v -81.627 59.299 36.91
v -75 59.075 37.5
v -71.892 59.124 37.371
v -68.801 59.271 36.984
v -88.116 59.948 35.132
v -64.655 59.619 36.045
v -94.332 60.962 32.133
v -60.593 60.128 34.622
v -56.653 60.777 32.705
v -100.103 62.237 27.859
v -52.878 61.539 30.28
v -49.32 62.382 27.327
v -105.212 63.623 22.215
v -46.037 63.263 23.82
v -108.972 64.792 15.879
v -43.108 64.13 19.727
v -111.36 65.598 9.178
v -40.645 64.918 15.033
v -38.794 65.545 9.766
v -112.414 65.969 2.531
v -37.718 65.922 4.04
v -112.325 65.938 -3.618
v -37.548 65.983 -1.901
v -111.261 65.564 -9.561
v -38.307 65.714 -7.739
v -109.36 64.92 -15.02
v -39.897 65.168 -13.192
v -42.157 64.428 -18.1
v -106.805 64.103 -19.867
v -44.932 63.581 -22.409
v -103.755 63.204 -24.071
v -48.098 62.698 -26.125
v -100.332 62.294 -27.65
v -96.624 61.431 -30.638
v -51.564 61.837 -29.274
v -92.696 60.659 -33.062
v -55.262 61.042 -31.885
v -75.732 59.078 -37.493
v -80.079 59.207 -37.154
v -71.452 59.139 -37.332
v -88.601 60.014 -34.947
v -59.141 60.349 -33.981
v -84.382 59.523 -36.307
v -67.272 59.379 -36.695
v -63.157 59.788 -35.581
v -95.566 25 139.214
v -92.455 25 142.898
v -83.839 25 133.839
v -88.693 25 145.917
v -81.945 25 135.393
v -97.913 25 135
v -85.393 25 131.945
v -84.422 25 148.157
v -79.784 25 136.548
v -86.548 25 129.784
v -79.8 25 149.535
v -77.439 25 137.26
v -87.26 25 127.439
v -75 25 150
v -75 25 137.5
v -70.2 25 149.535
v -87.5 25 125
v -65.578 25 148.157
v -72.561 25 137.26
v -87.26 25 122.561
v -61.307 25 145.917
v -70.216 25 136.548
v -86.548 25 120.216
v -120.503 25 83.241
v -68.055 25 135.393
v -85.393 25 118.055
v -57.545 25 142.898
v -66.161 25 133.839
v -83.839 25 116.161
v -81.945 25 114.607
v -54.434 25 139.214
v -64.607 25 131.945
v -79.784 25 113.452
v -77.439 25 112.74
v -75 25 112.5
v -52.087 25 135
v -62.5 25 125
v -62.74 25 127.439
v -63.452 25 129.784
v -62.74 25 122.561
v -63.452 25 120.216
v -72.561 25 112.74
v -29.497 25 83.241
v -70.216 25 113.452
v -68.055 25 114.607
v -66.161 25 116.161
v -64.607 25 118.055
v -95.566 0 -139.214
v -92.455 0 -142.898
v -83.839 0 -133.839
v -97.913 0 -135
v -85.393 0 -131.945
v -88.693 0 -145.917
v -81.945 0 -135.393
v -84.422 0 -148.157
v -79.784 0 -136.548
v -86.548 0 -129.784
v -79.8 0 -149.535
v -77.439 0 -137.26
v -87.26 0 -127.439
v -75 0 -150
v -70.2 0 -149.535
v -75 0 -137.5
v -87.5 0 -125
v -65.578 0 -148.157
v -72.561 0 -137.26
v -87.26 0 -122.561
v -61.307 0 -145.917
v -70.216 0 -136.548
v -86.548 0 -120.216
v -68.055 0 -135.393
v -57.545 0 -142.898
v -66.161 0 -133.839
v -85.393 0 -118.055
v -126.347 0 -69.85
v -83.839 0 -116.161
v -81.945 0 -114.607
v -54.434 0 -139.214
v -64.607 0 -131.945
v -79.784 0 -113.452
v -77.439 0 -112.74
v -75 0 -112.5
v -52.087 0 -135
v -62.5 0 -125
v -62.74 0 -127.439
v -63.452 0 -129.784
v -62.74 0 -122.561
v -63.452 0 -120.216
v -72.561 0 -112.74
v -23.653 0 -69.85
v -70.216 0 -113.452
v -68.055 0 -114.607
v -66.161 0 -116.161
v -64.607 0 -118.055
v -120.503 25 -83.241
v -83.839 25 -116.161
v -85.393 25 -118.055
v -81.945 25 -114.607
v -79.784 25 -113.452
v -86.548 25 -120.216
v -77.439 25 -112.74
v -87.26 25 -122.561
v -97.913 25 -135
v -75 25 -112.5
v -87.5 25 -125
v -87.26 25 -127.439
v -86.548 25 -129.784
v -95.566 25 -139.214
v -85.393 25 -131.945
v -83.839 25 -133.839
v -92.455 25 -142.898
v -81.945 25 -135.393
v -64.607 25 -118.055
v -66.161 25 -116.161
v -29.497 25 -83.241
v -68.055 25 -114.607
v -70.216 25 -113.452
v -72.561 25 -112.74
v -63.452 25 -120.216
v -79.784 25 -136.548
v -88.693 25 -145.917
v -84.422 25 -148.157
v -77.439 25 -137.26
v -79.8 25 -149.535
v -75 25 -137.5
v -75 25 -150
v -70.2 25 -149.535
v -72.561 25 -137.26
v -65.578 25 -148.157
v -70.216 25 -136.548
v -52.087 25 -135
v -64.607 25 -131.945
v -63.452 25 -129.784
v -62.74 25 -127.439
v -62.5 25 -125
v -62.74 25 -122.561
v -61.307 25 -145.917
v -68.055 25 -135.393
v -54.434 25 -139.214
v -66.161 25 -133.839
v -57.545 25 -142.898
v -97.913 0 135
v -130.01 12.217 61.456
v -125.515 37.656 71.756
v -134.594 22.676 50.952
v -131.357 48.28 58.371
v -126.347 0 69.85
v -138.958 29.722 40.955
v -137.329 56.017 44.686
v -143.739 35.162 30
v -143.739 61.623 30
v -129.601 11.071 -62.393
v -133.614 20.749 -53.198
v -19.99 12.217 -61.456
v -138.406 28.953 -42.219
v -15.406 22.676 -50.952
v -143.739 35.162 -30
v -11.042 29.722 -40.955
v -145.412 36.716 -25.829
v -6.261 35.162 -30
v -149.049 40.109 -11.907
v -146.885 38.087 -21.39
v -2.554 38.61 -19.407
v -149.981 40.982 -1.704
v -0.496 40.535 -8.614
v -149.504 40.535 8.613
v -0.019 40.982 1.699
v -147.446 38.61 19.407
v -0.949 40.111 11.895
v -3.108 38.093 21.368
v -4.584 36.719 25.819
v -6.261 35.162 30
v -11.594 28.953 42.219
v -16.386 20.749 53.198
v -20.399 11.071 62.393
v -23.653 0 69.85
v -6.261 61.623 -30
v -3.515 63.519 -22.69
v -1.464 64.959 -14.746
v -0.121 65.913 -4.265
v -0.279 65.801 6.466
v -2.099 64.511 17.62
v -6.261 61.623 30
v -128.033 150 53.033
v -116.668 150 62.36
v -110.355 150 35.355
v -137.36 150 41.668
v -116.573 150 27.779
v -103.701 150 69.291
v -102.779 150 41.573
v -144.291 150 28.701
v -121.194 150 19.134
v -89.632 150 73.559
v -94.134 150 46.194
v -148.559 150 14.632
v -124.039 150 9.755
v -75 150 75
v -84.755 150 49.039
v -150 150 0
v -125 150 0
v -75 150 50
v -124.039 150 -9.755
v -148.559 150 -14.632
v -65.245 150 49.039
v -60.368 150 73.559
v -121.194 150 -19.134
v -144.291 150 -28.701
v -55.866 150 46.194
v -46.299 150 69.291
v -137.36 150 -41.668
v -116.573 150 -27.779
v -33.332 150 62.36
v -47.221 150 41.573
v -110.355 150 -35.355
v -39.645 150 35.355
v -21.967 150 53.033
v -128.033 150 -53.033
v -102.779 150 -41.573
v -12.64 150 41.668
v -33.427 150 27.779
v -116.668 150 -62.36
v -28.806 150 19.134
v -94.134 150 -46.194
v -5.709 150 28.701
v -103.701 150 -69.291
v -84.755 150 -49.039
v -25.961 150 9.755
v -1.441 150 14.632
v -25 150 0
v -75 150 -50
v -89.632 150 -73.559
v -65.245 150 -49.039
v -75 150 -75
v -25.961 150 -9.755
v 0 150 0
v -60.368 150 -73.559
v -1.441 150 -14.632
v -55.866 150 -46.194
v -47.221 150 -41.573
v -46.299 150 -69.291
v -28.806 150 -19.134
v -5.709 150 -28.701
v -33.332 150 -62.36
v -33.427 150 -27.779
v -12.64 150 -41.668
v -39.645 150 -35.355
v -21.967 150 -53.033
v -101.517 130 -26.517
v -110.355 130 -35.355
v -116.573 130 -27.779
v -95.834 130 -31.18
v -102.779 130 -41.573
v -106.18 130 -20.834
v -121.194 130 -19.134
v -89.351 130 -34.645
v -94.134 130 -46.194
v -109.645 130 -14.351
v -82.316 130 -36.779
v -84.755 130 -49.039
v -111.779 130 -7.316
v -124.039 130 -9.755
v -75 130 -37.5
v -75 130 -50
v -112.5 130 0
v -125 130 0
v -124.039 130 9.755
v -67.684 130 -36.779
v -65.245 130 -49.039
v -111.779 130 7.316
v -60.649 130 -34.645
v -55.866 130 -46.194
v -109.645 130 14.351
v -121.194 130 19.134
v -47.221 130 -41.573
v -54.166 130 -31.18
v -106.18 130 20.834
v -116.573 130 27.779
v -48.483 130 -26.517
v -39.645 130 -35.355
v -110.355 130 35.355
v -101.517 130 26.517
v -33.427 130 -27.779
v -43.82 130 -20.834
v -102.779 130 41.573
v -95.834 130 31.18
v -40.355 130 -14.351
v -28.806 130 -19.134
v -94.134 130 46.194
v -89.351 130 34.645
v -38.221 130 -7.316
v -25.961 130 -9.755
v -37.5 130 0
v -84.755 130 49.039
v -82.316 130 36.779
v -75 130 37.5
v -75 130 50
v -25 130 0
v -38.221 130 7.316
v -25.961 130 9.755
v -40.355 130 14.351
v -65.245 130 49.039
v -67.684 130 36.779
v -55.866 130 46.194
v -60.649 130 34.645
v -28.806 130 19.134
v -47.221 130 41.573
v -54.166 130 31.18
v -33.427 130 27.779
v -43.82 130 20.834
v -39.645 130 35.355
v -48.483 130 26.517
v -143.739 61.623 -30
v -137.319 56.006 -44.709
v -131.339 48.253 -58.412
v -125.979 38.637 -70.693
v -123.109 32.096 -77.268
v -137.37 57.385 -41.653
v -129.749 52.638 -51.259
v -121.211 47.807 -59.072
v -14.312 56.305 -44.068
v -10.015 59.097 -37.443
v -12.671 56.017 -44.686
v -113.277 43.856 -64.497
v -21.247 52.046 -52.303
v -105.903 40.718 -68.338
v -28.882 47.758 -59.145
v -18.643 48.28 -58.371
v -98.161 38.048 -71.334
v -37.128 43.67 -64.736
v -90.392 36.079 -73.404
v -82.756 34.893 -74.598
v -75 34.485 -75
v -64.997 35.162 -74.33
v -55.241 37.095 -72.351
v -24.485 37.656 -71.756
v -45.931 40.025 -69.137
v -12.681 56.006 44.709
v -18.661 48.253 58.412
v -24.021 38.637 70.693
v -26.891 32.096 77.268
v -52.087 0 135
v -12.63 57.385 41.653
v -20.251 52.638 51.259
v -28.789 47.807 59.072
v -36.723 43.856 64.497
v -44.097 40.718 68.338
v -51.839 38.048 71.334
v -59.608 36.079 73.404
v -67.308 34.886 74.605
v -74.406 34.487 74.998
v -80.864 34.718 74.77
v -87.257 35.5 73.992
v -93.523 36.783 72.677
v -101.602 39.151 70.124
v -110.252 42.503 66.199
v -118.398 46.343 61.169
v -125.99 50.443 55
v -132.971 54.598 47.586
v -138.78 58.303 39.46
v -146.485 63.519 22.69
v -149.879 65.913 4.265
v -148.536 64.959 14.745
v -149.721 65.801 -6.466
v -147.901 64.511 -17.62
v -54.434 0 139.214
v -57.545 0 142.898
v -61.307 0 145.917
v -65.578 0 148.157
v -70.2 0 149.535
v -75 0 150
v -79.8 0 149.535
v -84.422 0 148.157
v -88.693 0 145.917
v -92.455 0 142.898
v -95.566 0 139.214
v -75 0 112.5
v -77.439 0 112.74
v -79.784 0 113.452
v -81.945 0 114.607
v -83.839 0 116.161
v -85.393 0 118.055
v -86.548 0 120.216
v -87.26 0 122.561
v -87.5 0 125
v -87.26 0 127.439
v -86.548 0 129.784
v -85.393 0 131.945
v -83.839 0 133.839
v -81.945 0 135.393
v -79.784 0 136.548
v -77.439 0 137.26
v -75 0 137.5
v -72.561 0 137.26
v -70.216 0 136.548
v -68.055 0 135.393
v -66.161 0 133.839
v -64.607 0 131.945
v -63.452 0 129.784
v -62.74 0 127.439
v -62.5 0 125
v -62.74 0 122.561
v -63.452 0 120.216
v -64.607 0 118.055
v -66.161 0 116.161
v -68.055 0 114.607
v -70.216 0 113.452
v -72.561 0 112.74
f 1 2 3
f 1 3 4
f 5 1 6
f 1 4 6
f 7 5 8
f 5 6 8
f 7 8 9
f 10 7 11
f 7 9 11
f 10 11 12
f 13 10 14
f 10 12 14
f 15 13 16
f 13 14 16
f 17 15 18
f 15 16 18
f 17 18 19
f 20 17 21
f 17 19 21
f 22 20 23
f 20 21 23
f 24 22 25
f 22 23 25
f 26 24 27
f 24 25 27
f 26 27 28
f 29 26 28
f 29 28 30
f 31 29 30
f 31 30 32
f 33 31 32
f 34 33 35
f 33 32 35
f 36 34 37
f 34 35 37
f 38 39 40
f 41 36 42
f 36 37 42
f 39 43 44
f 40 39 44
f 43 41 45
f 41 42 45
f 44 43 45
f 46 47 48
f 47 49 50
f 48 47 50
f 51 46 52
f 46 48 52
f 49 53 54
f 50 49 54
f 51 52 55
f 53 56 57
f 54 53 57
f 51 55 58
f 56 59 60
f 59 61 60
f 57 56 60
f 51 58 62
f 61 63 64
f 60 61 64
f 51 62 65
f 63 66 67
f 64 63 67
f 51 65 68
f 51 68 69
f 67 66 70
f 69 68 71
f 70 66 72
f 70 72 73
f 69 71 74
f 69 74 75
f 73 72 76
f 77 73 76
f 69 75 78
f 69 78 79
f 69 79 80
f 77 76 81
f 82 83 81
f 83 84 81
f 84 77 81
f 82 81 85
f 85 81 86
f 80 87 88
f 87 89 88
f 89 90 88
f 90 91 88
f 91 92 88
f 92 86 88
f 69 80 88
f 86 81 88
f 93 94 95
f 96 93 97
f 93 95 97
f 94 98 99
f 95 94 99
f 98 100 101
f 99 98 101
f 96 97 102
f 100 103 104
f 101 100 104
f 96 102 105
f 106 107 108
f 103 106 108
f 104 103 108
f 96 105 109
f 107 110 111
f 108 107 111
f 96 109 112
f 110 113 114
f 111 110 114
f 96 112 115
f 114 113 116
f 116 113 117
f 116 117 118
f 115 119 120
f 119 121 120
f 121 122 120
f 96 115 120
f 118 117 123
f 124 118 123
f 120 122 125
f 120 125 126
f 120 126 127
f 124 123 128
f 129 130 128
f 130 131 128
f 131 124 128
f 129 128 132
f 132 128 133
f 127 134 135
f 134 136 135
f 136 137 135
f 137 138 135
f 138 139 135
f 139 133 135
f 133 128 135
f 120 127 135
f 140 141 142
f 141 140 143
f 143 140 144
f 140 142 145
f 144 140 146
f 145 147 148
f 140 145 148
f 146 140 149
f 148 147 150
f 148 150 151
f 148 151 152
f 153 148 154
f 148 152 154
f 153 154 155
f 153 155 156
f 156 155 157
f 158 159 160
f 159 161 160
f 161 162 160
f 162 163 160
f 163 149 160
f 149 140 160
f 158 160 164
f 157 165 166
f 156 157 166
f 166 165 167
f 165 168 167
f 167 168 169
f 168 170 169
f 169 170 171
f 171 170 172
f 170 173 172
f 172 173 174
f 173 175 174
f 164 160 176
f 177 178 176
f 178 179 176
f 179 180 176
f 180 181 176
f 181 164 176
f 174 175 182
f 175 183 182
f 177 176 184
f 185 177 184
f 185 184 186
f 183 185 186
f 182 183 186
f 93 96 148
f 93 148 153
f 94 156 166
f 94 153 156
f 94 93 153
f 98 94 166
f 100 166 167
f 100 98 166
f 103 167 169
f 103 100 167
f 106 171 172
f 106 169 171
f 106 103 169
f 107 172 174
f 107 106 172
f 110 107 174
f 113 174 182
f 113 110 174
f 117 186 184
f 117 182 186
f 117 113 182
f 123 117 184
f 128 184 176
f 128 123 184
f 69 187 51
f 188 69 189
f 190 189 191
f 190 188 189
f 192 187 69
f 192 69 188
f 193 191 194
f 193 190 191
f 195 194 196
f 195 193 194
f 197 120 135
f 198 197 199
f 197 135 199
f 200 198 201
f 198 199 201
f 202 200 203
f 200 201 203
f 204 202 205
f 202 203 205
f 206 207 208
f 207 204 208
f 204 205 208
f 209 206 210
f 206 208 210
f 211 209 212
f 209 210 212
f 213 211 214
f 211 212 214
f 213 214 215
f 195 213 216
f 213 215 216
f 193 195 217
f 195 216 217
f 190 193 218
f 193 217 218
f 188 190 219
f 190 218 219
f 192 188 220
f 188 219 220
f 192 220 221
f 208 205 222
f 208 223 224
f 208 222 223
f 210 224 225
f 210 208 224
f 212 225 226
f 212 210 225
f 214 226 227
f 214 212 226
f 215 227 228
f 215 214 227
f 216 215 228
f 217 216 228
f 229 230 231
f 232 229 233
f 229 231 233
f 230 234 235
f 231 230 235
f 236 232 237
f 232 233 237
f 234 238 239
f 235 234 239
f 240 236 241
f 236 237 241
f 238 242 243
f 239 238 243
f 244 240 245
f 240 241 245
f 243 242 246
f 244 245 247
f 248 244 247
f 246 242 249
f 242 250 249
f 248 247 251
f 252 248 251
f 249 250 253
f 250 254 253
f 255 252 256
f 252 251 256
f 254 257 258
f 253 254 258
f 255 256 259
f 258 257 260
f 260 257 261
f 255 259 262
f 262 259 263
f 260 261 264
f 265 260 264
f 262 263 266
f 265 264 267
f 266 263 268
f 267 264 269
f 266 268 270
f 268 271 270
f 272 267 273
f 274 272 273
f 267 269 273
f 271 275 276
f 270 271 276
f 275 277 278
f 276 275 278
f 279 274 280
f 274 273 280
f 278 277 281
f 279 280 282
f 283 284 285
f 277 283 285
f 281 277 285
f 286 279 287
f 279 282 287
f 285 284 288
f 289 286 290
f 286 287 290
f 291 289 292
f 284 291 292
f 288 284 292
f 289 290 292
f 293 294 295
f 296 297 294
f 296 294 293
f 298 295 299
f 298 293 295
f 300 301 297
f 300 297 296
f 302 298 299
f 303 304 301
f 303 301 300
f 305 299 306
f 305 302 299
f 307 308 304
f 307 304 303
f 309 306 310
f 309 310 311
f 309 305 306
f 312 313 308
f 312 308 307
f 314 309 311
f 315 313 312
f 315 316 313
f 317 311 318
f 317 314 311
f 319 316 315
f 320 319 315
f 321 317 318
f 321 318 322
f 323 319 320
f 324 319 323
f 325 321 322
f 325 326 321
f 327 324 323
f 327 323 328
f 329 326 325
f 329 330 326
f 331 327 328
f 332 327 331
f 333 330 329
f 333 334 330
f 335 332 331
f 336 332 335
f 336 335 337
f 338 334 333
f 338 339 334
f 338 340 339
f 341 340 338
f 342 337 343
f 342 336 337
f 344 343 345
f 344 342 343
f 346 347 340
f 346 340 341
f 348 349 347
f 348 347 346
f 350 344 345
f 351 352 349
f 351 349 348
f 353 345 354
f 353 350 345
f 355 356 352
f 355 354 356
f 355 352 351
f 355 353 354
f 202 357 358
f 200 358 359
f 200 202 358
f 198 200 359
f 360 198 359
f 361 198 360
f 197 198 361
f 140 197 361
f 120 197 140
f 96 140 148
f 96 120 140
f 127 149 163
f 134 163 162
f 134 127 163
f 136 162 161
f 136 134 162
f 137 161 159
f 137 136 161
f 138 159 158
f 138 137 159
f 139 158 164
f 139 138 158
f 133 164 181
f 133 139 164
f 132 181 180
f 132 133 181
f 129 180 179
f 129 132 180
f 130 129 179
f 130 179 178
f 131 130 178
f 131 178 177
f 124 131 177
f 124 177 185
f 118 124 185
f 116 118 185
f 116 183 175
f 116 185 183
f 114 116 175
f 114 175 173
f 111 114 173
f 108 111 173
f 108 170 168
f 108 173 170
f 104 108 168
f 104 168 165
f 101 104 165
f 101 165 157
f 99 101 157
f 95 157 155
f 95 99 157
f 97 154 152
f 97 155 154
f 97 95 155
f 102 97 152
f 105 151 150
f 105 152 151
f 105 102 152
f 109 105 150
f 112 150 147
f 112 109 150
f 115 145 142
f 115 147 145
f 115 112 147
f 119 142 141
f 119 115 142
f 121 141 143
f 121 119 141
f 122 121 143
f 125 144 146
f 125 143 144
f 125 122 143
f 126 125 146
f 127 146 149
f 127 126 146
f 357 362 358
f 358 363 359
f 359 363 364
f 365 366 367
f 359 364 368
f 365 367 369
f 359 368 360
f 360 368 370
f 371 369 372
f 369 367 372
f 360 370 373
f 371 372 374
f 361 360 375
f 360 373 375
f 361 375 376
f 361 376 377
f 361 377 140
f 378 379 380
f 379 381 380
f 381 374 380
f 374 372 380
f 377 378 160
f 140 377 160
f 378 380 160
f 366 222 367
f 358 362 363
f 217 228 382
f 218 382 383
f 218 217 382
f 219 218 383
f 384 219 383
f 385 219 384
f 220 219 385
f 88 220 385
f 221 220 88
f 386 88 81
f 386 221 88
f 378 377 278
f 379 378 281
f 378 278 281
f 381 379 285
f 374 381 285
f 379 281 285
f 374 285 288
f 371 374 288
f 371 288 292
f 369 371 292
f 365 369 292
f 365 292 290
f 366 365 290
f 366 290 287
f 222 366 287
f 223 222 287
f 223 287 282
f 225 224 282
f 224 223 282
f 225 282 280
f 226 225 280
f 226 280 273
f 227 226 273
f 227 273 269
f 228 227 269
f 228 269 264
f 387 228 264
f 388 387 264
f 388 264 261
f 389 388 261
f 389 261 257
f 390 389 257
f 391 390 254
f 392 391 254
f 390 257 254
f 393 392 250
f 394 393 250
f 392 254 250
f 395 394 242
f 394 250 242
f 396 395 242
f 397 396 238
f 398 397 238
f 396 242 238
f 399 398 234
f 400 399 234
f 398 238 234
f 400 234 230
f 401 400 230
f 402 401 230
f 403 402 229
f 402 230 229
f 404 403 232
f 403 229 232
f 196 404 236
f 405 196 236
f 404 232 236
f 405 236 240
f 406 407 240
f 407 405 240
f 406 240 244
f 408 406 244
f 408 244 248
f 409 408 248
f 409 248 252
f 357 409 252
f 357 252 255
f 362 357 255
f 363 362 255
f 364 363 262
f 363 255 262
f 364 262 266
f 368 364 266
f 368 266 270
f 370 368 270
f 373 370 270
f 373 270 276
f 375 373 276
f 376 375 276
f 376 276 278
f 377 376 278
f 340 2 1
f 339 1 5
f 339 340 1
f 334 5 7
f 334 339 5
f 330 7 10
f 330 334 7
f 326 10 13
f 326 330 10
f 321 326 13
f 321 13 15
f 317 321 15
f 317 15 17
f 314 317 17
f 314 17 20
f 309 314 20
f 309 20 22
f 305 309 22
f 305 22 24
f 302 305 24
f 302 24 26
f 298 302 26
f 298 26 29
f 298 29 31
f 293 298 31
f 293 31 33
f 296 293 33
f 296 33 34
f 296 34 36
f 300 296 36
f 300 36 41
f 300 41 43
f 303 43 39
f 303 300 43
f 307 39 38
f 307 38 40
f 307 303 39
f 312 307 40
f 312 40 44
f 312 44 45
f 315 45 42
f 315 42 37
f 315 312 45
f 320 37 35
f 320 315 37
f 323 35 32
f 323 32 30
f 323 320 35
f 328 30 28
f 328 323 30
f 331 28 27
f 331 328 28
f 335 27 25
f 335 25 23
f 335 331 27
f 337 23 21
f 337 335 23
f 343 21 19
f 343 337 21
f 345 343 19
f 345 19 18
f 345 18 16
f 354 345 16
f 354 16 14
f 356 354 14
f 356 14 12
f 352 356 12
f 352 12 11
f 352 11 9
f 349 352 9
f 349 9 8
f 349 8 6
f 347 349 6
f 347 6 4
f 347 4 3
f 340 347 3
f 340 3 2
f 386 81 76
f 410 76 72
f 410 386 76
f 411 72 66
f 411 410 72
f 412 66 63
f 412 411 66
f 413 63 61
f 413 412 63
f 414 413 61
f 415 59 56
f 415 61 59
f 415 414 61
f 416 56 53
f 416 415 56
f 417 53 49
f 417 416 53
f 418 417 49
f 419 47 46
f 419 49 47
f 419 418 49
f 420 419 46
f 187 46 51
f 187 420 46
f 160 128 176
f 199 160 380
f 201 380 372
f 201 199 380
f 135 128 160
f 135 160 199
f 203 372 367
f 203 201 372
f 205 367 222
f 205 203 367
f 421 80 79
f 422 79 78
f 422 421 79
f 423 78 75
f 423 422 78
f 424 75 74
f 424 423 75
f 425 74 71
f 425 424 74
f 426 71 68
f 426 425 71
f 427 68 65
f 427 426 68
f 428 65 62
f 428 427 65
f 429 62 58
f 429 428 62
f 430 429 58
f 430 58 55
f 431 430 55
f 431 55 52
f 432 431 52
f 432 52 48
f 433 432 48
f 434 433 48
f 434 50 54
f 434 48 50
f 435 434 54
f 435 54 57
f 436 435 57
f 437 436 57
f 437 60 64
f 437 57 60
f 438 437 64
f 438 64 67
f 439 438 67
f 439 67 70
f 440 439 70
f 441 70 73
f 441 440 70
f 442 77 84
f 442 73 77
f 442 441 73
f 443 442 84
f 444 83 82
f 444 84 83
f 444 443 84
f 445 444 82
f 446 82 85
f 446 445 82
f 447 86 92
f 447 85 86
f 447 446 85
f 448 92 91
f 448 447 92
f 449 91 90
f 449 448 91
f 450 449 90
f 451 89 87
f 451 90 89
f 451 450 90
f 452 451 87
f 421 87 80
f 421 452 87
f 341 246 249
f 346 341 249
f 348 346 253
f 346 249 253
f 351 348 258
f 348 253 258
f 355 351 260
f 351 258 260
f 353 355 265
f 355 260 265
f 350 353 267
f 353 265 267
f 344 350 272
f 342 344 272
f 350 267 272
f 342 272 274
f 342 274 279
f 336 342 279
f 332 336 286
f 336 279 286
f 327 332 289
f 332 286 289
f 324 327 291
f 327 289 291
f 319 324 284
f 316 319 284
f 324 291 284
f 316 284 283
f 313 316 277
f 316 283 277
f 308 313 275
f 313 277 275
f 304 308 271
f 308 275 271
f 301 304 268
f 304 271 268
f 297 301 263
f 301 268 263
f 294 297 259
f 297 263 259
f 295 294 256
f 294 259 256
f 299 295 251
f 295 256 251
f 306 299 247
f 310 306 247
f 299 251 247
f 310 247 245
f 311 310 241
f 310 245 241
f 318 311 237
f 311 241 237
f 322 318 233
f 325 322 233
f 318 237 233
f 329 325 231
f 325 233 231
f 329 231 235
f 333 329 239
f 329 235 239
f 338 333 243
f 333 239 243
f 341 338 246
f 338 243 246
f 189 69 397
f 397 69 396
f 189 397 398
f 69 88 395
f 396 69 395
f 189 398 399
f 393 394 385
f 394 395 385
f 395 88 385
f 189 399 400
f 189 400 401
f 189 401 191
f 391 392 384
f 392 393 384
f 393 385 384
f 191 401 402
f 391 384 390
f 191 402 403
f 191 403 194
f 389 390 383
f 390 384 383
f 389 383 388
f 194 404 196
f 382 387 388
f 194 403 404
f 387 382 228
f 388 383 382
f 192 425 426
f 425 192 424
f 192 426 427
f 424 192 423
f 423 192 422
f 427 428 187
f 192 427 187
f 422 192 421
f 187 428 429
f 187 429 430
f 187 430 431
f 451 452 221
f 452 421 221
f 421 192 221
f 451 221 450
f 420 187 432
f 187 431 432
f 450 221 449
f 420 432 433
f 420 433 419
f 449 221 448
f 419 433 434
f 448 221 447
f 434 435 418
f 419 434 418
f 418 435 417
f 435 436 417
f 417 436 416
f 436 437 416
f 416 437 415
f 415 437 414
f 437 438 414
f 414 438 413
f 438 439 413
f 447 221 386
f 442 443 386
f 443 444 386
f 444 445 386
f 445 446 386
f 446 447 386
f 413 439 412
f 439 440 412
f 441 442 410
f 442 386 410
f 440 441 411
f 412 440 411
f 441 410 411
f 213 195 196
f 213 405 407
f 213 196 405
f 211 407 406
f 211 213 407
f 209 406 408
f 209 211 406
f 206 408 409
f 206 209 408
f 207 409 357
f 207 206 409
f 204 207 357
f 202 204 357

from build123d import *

# Parameters (mm, degrees)
BOSS_EXTRUDE1_DEPTH      = 150
SKETCH2_OUTSIDE_W        = 220.368
SKETCH2_OUTSIDE_H        = 370.368
SKETCH2_OUTSIDE_R        = 12.5
CUT_EXTRUDE3_DEPTH       = 150
BOSS_EXTRUDE6_REACH      = 261.808
BOSS_EXTRUDE6_END_RADIUS = 105
SKETCH5_R                = 75
SKETCH5_R_2              = 37.5
SKETCH6_R                = 50
CUT_EXTRUDE4_DEPTH       = 20


with BuildPart() as part:
    # Sketch1 → Boss-Extrude1 (new body)
    with BuildSketch(Plane(origin=(0, 0, 0), x_dir=(0, 0, -1), z_dir=(1, 0, 0))):
        with BuildLine():
            Line((83.240615087, 25), (150, 25))
            Line((150, 25), (150, 0))
            Line((150, 0), (69.84983894, 0))
            ThreePointArc((69.84983894, 0), (0, 41), (-69.84983894, 0))
            Line((-69.84983894, 0), (-150, 0))
            Line((-150, 0), (-150, 25))
            Line((-150, 25), (-83.240615087, 25))
            ThreePointArc((-83.240615087, 25), (0, 66), (83.240615087, 25))
        make_face()
    extrude(amount=-BOSS_EXTRUDE1_DEPTH)

    # Sketch2 outside → Cut-Extrude3 (cut)
    # profile 1 of 3: a face of its own
    with BuildSketch(Plane(origin=(0, 0, 0), x_dir=(1, 0, 0), z_dir=(0, 1, 0))):
        with Locations((-75, 0)):
            Rectangle(SKETCH2_OUTSIDE_W, SKETCH2_OUTSIDE_H)
        with BuildLine():
            Line((-143.738635424, 30), (-97.912878475, 135))
            ThreePointArc((-97.912878475, 135), (-75, 150), (-52.087121525, 135))
            Line((-52.087121525, 135), (-6.261364576, 30))
            ThreePointArc((-6.261364576, 30), (0, 0), (-6.261364576, -30))
            Line((-6.261364576, -30), (-52.087121525, -135))
            ThreePointArc((-52.087121525, -135), (-75, -150), (-97.912878475, -135))
            Line((-97.912878475, -135), (-143.738635424, -30))
            ThreePointArc((-143.738635424, -30), (-150, 0), (-143.738635424, 30))
        make_face(mode=Mode.SUBTRACT)
    # profile 2 of 3: a face of its own
    with BuildSketch(Plane(origin=(0, 0, 0), x_dir=(1, 0, 0), z_dir=(0, 1, 0))):
        with Locations(Location((-75, 125, 0), (0, 0, 270))):
            Circle(SKETCH2_OUTSIDE_R)
    # profile 3 of 3: a face of its own
    with BuildSketch(Plane(origin=(0, 0, 0), x_dir=(1, 0, 0), z_dir=(0, 1, 0))):
        with Locations(Location((-75, -125, 0), (0, 0, 90))):
            Circle(SKETCH2_OUTSIDE_R)
    extrude(amount=CUT_EXTRUDE3_DEPTH, mode=Mode.SUBTRACT)

    # Boss-Extrude6: up to this cylinder (the profile starts outside it)
    boss_extrude6_end = Plane(origin=(-75, -39, 0), z_dir=(1, 0, 0)) * Cylinder(BOSS_EXTRUDE6_END_RADIUS, 734.616, mode=Mode.PRIVATE)
    # Sketch5 → Boss-Extrude6 (add, up to the surface)
    with BuildSketch(Plane(origin=(0, 150, 0), x_dir=(-1, 0, 0), z_dir=(0, -1, 0)), mode=Mode.PRIVATE) as boss_extrude6_sk1:
        with Locations(Location((75, 0, 0), (0, 0, 90))):
            Circle(SKETCH5_R)
        with Locations(Location((75, 0, 0), (0, 0, 270))):
            Circle(SKETCH5_R_2, mode=Mode.SUBTRACT)
    boss_extrude6_tool1 = extrude(boss_extrude6_sk1.sketch, amount=BOSS_EXTRUDE6_REACH, mode=Mode.PRIVATE) - boss_extrude6_end
    add(boss_extrude6_tool1.solids().sort_by_distance((-75, 150, 72.87868))[0])

    # Sketch6 → Cut-Extrude4 (cut)
    with BuildSketch(Plane(origin=(0, 150, 0), x_dir=(1, 0, 0), z_dir=(0, 1, 0))):
        with Locations(Location((-75, 0, 0), (0, 0, 270))):
            Circle(SKETCH6_R)
    extrude(amount=-CUT_EXTRUDE4_DEPTH, mode=Mode.SUBTRACT)


solid = part.part
